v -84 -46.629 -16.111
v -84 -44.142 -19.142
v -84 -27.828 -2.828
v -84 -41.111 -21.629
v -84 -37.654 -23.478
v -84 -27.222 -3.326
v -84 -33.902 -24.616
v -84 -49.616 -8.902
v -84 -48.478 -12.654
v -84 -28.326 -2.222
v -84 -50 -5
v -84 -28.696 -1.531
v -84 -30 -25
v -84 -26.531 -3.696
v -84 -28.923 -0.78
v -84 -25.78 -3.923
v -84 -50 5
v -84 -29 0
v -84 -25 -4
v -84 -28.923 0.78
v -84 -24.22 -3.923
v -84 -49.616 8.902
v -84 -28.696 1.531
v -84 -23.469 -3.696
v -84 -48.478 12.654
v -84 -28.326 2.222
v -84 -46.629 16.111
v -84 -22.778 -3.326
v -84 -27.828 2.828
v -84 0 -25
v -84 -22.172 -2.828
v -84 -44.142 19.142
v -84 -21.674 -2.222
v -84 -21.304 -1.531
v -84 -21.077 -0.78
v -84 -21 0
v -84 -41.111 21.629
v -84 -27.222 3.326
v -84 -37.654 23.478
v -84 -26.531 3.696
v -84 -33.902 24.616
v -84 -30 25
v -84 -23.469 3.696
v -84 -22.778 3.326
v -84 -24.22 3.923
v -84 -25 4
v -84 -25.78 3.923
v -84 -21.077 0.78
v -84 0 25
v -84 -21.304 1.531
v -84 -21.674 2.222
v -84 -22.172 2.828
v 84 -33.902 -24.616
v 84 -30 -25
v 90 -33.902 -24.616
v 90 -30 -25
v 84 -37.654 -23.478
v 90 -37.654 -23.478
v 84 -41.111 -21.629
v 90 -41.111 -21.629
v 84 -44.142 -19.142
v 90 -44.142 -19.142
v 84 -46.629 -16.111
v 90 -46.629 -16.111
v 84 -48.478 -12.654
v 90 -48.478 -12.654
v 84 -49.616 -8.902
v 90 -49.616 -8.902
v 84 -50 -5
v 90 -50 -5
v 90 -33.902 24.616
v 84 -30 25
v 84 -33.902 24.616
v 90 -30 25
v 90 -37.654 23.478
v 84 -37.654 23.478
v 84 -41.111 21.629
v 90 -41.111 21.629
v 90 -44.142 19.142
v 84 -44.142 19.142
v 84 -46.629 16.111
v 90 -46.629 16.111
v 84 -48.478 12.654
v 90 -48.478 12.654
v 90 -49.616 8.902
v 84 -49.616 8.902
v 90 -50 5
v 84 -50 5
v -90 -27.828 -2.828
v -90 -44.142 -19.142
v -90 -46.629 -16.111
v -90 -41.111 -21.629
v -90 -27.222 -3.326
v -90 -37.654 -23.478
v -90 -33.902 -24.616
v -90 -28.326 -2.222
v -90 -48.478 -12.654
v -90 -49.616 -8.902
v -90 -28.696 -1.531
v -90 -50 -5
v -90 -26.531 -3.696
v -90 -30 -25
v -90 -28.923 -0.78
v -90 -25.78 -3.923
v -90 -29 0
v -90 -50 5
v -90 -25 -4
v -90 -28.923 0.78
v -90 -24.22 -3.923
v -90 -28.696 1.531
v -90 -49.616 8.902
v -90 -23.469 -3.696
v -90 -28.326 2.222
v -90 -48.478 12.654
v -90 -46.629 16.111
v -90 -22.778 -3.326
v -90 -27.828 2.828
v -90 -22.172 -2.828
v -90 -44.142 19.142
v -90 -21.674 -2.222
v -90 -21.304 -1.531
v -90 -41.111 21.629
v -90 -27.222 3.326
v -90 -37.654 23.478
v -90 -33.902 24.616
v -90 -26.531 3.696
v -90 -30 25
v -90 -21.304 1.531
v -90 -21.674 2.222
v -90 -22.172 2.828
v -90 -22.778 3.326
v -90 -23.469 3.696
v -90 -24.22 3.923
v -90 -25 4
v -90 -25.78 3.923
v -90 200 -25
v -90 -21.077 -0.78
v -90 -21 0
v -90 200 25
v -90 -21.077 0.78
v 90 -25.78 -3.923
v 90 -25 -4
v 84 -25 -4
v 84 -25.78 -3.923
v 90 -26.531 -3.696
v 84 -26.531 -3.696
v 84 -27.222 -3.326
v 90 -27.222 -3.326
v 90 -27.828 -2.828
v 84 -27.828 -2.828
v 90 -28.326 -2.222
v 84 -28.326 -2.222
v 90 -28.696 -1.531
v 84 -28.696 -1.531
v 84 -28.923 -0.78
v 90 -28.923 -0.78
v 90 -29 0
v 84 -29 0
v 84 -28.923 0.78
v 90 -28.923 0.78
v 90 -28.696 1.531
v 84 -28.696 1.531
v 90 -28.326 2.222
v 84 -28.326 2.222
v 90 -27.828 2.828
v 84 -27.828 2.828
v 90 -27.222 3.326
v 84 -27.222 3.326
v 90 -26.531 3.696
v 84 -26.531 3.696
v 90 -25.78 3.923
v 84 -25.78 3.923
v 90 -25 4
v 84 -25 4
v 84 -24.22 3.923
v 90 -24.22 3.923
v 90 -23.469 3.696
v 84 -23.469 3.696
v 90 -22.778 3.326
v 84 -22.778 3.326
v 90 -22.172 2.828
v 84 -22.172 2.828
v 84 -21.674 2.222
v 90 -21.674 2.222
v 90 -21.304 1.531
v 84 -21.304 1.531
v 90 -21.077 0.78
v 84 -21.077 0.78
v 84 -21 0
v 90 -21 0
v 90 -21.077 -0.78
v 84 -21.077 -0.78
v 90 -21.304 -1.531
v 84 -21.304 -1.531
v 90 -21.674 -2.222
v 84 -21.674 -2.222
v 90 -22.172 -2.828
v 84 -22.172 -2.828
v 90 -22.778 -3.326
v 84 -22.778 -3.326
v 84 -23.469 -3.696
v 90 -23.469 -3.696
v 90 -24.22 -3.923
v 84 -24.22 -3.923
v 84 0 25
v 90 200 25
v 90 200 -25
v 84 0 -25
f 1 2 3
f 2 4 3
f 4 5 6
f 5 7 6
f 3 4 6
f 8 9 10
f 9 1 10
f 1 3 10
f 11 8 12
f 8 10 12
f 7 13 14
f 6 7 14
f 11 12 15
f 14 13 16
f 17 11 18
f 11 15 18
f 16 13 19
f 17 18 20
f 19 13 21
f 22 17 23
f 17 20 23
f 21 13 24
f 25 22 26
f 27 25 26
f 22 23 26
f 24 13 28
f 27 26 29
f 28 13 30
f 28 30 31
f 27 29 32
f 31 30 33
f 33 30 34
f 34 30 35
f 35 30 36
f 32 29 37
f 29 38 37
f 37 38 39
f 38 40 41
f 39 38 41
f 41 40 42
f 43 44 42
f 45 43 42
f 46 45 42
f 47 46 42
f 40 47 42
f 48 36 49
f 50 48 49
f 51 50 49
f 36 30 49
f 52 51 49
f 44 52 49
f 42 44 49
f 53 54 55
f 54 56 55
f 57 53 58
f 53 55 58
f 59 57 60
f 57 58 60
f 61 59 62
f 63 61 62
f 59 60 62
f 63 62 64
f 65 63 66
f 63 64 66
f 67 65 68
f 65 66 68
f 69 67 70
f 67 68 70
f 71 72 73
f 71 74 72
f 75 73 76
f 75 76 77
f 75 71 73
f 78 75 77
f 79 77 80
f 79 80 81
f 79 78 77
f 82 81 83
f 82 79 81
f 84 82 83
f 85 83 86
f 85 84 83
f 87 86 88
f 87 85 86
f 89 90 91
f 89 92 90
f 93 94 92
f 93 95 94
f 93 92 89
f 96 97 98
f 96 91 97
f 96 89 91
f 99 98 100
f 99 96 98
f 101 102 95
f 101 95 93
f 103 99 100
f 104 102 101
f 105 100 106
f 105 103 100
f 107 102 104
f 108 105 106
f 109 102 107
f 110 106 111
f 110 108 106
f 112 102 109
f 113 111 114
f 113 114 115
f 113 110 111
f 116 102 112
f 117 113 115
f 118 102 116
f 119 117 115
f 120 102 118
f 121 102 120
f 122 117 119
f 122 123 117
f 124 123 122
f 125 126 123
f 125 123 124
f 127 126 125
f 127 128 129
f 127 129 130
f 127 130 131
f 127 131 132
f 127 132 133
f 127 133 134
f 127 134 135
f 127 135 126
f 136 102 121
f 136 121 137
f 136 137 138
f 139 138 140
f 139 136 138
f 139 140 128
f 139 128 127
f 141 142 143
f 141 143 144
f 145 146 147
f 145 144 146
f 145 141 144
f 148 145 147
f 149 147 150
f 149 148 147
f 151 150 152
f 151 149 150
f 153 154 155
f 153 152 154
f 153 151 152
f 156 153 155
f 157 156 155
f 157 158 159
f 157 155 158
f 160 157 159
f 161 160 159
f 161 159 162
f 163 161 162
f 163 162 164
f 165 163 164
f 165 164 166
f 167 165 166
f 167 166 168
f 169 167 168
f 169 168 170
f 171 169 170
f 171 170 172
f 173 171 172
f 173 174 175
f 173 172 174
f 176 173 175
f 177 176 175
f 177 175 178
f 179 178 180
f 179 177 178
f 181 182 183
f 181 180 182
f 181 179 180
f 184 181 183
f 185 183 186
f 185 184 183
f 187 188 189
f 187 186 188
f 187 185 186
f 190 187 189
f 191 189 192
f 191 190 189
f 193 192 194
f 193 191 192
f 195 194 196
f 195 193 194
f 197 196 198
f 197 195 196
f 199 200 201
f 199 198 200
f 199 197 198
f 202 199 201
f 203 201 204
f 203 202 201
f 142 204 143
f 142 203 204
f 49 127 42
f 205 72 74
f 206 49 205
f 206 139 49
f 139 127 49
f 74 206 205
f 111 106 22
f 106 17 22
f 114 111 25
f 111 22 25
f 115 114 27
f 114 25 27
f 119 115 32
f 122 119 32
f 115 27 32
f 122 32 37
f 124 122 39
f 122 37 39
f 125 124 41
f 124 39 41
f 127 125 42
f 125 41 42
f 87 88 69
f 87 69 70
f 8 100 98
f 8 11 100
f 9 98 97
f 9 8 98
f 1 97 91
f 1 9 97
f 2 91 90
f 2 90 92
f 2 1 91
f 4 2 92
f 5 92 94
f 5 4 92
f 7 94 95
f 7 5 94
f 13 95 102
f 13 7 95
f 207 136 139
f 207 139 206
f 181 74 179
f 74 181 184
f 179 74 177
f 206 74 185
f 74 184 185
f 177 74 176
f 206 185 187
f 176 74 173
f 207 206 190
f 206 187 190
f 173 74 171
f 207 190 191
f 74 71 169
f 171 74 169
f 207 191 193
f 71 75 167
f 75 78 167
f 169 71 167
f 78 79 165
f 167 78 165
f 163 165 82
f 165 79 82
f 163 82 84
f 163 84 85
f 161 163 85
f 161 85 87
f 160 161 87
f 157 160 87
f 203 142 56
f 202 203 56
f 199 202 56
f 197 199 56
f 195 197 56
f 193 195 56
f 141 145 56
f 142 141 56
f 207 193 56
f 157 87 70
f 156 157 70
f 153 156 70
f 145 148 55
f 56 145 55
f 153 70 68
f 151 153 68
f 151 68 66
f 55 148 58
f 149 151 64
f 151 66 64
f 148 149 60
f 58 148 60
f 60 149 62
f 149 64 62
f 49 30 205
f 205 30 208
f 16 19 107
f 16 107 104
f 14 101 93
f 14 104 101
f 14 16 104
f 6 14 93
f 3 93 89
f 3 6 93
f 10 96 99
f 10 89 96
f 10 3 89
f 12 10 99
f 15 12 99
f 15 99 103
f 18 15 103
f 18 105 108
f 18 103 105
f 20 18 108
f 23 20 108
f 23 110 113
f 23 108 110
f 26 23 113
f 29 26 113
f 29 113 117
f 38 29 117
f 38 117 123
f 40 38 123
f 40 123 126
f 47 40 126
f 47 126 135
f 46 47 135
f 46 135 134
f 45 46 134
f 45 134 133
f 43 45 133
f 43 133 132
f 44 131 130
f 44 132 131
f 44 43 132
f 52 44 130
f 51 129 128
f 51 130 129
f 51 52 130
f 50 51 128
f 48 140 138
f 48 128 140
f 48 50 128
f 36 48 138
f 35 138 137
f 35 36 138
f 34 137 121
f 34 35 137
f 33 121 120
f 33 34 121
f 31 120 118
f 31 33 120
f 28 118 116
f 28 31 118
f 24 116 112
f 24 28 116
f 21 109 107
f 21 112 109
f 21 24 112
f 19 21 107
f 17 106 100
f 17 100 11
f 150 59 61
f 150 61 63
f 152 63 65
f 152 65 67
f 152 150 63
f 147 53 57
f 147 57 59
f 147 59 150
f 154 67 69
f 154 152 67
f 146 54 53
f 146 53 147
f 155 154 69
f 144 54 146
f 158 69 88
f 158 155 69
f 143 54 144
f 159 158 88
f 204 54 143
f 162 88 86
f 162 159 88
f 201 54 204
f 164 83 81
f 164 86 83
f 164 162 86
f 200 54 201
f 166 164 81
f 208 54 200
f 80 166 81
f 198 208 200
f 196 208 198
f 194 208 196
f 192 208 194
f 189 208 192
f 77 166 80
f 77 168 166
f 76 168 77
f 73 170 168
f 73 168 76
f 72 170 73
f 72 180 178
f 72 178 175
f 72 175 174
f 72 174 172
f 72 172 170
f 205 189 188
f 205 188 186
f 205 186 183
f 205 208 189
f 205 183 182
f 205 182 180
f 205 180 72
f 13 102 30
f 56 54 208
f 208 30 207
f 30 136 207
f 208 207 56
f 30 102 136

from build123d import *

# Parameters (mm, degrees)
SKETCH1_W           = 180
SKETCH1_H           = 50
EXTRUDE1_DEPTH      = 200
SKETCH2_W           = 6
SKETCH2_H           = 50
EXTRUDE2_DEPTH      = 50
EXTRUDE3_DEPTH      = 477
EXTRUDE3_DEPTH_BACK = 40
SKETCH3_R           = 4
FILLET1_R           = 20


with BuildPart() as part:
    # Sketch1 → Extrude1 (new body)
    with BuildSketch(Plane(origin=(0, 0, 0), x_dir=(1, 0, 0), z_dir=(0, 1, 0))):
        Rectangle(SKETCH1_W, SKETCH1_H)
    extrude(amount=EXTRUDE1_DEPTH)

    # Sketch2 → Extrude2 (add)
    with BuildSketch(Plane.XZ):
        with Locations((-87, 0)):
            Rectangle(SKETCH2_W, SKETCH2_H)
        with Locations((87, 0)):
            Rectangle(SKETCH2_W, SKETCH2_H)
    extrude(amount=EXTRUDE2_DEPTH)

    # Sketch3 → Extrude3 (cut, two sides: drawn at the far end of the back side and taken through both)
    with BuildSketch(Plane.ZY.offset(-84).offset(-EXTRUDE3_DEPTH_BACK)):
        with Locations(Location((0, -25, 0), (0, 0, 180))):
            Circle(SKETCH3_R)
    extrude(amount=EXTRUDE3_DEPTH + EXTRUDE3_DEPTH_BACK, mode=Mode.SUBTRACT)

    # Fillet1
    fillet1_edges = [part.edges().sort_by_distance(p)[0] for p in [
        (-87, -50, -25),
        (-87, -50, 25),
        (87, -50, 25),
        (87, -50, -25),
    ]]
    fillet(fillet1_edges, radius=FILLET1_R)


solid = part.part
